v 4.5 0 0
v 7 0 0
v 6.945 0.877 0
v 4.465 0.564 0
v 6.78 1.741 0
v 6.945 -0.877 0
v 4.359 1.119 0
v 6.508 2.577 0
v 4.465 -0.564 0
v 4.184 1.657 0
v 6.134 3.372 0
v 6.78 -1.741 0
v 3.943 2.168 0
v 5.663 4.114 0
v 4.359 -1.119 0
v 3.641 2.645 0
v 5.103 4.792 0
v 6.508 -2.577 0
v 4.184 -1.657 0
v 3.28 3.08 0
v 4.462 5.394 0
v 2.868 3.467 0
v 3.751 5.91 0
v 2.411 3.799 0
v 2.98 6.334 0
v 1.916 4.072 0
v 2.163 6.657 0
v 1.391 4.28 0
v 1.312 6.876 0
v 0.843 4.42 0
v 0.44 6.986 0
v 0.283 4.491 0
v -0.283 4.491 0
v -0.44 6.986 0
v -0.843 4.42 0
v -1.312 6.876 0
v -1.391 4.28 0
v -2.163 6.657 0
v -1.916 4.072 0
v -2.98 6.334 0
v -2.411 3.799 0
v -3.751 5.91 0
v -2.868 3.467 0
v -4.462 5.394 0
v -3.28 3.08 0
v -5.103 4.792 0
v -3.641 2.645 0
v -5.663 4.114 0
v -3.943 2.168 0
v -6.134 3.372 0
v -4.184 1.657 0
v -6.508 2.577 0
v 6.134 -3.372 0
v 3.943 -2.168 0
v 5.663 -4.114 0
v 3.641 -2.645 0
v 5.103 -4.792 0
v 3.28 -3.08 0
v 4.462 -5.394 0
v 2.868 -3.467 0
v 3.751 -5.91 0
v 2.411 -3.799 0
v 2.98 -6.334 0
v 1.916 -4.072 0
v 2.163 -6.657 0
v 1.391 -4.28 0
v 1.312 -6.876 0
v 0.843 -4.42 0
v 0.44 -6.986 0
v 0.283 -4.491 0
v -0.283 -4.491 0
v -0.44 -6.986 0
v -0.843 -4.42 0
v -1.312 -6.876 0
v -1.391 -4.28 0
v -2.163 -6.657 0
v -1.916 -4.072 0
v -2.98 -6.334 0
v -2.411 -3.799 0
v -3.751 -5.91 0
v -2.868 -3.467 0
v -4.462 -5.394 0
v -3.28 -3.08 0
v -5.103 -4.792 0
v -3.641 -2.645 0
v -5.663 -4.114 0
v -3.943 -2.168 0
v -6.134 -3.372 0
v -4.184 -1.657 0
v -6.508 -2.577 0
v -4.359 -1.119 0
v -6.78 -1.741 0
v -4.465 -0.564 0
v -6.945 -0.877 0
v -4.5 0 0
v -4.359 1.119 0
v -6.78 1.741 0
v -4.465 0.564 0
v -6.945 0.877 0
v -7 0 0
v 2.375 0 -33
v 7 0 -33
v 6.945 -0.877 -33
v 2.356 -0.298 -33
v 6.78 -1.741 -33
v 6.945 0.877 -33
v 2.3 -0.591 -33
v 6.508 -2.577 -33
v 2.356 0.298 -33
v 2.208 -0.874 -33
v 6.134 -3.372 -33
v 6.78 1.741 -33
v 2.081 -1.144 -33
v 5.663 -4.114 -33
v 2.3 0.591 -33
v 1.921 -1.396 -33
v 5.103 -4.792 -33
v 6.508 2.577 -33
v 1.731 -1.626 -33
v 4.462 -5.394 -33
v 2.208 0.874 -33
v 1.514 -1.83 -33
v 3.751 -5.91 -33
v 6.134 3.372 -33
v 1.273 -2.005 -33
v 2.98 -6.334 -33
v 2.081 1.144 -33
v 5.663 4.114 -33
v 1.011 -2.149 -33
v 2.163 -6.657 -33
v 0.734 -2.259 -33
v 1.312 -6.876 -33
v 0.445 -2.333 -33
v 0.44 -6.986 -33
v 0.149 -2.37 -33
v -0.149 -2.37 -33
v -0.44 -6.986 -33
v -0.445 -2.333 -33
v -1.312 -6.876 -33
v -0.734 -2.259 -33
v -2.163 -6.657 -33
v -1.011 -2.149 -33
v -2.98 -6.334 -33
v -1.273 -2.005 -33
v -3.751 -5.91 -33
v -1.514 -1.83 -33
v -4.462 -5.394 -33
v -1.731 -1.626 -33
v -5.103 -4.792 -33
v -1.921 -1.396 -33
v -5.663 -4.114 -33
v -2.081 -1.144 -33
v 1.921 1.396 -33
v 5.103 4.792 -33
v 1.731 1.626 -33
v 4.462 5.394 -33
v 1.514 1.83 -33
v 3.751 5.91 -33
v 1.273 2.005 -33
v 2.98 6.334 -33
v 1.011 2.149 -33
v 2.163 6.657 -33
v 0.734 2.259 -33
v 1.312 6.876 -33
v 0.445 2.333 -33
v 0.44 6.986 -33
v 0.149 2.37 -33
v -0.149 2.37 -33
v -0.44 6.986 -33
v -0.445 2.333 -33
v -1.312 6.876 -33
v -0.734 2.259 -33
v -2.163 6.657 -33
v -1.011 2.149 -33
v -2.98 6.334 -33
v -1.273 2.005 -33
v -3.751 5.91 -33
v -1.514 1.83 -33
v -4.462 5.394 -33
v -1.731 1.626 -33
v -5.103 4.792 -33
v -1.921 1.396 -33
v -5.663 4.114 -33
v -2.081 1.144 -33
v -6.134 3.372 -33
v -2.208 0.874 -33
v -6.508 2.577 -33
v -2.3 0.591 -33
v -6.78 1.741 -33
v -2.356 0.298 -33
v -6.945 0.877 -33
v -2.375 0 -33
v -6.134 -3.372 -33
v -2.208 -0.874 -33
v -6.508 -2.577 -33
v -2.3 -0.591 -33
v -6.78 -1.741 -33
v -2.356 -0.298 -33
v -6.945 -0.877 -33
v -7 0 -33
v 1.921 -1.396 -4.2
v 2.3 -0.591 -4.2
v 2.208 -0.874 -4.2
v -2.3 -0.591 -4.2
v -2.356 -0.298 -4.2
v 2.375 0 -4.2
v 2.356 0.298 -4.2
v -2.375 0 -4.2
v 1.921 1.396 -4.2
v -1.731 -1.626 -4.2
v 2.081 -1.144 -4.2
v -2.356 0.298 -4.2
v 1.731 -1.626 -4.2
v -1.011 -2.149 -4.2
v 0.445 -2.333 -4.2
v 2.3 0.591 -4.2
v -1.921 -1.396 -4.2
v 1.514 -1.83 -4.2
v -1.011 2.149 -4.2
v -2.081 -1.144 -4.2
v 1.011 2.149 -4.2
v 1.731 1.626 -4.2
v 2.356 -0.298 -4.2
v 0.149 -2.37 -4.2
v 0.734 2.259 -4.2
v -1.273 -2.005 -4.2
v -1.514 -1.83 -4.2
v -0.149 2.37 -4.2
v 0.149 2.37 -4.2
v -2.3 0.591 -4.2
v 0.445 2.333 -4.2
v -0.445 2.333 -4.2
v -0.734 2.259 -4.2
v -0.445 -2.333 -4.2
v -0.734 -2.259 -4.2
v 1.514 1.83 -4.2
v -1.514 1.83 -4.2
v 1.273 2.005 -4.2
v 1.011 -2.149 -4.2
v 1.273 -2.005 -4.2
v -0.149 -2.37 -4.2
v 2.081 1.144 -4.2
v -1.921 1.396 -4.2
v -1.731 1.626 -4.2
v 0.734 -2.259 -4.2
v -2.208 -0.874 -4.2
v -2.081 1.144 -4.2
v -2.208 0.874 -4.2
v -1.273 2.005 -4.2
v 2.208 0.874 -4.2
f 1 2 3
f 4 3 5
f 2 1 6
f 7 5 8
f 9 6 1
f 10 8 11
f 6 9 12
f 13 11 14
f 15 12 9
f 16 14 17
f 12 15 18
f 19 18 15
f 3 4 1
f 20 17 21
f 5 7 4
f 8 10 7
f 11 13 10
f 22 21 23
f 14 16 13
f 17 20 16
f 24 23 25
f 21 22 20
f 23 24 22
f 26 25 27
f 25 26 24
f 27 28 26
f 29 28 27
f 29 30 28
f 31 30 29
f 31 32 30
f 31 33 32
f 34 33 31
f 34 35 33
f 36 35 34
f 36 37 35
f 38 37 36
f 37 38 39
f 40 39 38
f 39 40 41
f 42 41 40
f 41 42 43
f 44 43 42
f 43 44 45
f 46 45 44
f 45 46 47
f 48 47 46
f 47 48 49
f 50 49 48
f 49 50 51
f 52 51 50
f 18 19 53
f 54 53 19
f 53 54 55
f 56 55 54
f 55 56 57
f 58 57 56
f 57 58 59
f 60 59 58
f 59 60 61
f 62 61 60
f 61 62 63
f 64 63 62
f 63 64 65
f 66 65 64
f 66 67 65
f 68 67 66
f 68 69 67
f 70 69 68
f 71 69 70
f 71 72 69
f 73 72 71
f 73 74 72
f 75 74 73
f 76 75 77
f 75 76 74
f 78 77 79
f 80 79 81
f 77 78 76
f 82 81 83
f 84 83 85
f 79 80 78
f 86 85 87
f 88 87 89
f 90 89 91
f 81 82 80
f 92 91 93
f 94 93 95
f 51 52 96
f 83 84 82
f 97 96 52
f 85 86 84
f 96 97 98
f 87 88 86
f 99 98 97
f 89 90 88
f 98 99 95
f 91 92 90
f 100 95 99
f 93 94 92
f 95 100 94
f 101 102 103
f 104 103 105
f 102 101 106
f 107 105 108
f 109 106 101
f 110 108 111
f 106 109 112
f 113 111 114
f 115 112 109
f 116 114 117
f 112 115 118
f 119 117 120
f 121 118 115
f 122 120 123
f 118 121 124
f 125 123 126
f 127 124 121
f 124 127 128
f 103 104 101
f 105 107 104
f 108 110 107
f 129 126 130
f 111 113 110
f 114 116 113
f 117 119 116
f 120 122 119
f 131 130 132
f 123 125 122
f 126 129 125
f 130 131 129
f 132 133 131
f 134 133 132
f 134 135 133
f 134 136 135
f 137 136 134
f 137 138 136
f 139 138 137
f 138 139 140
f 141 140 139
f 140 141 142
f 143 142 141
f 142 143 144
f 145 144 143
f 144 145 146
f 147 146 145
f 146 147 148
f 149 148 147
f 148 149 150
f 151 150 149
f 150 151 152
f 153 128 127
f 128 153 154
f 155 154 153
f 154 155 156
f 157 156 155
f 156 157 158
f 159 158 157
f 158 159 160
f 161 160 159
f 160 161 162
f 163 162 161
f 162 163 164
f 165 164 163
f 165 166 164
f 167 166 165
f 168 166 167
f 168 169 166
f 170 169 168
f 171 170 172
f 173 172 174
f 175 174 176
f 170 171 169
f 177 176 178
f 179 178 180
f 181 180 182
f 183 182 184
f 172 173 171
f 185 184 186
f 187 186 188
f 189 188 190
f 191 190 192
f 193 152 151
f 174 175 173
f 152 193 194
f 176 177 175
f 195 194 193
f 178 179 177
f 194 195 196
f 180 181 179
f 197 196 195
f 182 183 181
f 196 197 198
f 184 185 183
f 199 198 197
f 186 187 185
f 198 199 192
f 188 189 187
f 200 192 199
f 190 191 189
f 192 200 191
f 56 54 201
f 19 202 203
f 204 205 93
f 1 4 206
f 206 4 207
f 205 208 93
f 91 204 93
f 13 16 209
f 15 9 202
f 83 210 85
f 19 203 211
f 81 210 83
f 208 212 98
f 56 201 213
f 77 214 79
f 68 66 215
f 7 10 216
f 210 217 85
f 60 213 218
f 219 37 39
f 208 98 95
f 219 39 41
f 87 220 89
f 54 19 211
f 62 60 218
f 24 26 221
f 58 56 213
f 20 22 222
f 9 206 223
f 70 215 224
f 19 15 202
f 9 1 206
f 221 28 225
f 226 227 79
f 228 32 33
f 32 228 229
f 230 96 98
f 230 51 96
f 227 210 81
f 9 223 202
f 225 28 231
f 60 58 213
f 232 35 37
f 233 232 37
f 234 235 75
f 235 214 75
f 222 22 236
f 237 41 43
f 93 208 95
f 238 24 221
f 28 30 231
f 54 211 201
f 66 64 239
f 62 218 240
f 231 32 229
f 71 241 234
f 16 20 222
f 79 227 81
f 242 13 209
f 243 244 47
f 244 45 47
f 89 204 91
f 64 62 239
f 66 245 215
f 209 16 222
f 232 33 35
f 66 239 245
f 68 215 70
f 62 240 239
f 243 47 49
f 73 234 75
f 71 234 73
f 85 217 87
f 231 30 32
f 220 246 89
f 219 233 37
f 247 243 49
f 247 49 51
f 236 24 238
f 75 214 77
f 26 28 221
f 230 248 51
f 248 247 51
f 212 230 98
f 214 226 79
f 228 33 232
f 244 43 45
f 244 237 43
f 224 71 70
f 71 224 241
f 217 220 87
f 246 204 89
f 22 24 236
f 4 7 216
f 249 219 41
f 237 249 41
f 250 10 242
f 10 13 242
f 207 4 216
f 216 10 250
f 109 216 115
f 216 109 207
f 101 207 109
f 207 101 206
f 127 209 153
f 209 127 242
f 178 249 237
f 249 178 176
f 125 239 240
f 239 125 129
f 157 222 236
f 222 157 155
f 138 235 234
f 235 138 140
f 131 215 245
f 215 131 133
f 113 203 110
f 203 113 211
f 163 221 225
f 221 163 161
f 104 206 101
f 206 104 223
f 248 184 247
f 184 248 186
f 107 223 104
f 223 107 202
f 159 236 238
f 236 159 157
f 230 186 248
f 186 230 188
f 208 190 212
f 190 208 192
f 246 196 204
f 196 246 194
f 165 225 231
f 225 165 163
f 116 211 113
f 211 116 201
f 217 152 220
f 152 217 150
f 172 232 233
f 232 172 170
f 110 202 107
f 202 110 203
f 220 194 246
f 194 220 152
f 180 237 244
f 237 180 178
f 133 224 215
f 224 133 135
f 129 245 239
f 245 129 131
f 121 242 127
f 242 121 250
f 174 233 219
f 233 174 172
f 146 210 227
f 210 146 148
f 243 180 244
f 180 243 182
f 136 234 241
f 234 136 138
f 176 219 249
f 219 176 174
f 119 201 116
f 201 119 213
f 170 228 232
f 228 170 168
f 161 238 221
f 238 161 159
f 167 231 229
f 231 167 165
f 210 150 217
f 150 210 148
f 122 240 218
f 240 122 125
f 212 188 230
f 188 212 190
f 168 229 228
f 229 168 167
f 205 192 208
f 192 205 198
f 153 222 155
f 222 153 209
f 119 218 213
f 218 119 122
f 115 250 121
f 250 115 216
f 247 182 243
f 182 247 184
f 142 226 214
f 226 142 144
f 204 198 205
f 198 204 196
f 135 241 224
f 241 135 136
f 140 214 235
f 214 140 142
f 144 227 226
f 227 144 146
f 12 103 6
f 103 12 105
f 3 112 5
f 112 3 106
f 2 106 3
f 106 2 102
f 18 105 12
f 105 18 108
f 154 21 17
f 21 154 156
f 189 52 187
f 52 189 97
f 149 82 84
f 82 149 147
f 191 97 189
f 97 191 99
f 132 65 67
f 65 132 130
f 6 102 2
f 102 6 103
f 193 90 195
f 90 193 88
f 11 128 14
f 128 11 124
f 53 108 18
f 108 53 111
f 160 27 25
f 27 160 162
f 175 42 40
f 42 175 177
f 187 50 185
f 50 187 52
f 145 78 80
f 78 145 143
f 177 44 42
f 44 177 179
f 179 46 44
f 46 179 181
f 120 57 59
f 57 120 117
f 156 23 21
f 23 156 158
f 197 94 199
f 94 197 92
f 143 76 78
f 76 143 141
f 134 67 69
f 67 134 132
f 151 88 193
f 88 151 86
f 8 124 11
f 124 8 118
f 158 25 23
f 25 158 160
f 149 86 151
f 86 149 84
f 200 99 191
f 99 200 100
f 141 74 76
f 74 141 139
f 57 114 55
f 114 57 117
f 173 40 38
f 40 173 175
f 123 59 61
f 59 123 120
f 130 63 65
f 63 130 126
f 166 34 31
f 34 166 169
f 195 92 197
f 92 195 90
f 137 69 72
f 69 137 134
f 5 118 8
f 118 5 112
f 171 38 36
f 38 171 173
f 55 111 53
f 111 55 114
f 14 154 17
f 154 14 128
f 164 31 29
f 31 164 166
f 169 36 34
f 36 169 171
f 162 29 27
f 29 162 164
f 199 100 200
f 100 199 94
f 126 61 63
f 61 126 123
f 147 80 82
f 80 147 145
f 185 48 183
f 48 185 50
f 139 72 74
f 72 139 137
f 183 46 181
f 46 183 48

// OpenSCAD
$fn = 50;


difference() {
	union() {
		translate(v = [0, 0, -33.0000000000]) {
			cylinder(h = 33, r = 7.0000000000);
		}
		cylinder(h = 0, r = 13.0000000000);
	}
	union() {
		translate(v = [0, 0, 0]) {
			rotate(a = [0, 0, 0]) {
				difference() {
					union() {
						#translate(v = [0, 0, -33.0000000000]) {
							cylinder(h = 33, r = 2.2500000000);
						}
						#translate(v = [0, 0, -4.2000000000]) {
							cylinder(h = 4.2000000000, r1 = 2.3750000000, r2 = 4.5000000000);
						}
						#translate(v = [0, 0, -33.0000000000]) {
							cylinder(h = 33, r = 2.3750000000);
						}
						#translate(v = [0, 0, -33.0000000000]) {
							cylinder(h = 33, r = 2.2500000000);
						}
					}
					union();
				}
			}
		}
	}
}
